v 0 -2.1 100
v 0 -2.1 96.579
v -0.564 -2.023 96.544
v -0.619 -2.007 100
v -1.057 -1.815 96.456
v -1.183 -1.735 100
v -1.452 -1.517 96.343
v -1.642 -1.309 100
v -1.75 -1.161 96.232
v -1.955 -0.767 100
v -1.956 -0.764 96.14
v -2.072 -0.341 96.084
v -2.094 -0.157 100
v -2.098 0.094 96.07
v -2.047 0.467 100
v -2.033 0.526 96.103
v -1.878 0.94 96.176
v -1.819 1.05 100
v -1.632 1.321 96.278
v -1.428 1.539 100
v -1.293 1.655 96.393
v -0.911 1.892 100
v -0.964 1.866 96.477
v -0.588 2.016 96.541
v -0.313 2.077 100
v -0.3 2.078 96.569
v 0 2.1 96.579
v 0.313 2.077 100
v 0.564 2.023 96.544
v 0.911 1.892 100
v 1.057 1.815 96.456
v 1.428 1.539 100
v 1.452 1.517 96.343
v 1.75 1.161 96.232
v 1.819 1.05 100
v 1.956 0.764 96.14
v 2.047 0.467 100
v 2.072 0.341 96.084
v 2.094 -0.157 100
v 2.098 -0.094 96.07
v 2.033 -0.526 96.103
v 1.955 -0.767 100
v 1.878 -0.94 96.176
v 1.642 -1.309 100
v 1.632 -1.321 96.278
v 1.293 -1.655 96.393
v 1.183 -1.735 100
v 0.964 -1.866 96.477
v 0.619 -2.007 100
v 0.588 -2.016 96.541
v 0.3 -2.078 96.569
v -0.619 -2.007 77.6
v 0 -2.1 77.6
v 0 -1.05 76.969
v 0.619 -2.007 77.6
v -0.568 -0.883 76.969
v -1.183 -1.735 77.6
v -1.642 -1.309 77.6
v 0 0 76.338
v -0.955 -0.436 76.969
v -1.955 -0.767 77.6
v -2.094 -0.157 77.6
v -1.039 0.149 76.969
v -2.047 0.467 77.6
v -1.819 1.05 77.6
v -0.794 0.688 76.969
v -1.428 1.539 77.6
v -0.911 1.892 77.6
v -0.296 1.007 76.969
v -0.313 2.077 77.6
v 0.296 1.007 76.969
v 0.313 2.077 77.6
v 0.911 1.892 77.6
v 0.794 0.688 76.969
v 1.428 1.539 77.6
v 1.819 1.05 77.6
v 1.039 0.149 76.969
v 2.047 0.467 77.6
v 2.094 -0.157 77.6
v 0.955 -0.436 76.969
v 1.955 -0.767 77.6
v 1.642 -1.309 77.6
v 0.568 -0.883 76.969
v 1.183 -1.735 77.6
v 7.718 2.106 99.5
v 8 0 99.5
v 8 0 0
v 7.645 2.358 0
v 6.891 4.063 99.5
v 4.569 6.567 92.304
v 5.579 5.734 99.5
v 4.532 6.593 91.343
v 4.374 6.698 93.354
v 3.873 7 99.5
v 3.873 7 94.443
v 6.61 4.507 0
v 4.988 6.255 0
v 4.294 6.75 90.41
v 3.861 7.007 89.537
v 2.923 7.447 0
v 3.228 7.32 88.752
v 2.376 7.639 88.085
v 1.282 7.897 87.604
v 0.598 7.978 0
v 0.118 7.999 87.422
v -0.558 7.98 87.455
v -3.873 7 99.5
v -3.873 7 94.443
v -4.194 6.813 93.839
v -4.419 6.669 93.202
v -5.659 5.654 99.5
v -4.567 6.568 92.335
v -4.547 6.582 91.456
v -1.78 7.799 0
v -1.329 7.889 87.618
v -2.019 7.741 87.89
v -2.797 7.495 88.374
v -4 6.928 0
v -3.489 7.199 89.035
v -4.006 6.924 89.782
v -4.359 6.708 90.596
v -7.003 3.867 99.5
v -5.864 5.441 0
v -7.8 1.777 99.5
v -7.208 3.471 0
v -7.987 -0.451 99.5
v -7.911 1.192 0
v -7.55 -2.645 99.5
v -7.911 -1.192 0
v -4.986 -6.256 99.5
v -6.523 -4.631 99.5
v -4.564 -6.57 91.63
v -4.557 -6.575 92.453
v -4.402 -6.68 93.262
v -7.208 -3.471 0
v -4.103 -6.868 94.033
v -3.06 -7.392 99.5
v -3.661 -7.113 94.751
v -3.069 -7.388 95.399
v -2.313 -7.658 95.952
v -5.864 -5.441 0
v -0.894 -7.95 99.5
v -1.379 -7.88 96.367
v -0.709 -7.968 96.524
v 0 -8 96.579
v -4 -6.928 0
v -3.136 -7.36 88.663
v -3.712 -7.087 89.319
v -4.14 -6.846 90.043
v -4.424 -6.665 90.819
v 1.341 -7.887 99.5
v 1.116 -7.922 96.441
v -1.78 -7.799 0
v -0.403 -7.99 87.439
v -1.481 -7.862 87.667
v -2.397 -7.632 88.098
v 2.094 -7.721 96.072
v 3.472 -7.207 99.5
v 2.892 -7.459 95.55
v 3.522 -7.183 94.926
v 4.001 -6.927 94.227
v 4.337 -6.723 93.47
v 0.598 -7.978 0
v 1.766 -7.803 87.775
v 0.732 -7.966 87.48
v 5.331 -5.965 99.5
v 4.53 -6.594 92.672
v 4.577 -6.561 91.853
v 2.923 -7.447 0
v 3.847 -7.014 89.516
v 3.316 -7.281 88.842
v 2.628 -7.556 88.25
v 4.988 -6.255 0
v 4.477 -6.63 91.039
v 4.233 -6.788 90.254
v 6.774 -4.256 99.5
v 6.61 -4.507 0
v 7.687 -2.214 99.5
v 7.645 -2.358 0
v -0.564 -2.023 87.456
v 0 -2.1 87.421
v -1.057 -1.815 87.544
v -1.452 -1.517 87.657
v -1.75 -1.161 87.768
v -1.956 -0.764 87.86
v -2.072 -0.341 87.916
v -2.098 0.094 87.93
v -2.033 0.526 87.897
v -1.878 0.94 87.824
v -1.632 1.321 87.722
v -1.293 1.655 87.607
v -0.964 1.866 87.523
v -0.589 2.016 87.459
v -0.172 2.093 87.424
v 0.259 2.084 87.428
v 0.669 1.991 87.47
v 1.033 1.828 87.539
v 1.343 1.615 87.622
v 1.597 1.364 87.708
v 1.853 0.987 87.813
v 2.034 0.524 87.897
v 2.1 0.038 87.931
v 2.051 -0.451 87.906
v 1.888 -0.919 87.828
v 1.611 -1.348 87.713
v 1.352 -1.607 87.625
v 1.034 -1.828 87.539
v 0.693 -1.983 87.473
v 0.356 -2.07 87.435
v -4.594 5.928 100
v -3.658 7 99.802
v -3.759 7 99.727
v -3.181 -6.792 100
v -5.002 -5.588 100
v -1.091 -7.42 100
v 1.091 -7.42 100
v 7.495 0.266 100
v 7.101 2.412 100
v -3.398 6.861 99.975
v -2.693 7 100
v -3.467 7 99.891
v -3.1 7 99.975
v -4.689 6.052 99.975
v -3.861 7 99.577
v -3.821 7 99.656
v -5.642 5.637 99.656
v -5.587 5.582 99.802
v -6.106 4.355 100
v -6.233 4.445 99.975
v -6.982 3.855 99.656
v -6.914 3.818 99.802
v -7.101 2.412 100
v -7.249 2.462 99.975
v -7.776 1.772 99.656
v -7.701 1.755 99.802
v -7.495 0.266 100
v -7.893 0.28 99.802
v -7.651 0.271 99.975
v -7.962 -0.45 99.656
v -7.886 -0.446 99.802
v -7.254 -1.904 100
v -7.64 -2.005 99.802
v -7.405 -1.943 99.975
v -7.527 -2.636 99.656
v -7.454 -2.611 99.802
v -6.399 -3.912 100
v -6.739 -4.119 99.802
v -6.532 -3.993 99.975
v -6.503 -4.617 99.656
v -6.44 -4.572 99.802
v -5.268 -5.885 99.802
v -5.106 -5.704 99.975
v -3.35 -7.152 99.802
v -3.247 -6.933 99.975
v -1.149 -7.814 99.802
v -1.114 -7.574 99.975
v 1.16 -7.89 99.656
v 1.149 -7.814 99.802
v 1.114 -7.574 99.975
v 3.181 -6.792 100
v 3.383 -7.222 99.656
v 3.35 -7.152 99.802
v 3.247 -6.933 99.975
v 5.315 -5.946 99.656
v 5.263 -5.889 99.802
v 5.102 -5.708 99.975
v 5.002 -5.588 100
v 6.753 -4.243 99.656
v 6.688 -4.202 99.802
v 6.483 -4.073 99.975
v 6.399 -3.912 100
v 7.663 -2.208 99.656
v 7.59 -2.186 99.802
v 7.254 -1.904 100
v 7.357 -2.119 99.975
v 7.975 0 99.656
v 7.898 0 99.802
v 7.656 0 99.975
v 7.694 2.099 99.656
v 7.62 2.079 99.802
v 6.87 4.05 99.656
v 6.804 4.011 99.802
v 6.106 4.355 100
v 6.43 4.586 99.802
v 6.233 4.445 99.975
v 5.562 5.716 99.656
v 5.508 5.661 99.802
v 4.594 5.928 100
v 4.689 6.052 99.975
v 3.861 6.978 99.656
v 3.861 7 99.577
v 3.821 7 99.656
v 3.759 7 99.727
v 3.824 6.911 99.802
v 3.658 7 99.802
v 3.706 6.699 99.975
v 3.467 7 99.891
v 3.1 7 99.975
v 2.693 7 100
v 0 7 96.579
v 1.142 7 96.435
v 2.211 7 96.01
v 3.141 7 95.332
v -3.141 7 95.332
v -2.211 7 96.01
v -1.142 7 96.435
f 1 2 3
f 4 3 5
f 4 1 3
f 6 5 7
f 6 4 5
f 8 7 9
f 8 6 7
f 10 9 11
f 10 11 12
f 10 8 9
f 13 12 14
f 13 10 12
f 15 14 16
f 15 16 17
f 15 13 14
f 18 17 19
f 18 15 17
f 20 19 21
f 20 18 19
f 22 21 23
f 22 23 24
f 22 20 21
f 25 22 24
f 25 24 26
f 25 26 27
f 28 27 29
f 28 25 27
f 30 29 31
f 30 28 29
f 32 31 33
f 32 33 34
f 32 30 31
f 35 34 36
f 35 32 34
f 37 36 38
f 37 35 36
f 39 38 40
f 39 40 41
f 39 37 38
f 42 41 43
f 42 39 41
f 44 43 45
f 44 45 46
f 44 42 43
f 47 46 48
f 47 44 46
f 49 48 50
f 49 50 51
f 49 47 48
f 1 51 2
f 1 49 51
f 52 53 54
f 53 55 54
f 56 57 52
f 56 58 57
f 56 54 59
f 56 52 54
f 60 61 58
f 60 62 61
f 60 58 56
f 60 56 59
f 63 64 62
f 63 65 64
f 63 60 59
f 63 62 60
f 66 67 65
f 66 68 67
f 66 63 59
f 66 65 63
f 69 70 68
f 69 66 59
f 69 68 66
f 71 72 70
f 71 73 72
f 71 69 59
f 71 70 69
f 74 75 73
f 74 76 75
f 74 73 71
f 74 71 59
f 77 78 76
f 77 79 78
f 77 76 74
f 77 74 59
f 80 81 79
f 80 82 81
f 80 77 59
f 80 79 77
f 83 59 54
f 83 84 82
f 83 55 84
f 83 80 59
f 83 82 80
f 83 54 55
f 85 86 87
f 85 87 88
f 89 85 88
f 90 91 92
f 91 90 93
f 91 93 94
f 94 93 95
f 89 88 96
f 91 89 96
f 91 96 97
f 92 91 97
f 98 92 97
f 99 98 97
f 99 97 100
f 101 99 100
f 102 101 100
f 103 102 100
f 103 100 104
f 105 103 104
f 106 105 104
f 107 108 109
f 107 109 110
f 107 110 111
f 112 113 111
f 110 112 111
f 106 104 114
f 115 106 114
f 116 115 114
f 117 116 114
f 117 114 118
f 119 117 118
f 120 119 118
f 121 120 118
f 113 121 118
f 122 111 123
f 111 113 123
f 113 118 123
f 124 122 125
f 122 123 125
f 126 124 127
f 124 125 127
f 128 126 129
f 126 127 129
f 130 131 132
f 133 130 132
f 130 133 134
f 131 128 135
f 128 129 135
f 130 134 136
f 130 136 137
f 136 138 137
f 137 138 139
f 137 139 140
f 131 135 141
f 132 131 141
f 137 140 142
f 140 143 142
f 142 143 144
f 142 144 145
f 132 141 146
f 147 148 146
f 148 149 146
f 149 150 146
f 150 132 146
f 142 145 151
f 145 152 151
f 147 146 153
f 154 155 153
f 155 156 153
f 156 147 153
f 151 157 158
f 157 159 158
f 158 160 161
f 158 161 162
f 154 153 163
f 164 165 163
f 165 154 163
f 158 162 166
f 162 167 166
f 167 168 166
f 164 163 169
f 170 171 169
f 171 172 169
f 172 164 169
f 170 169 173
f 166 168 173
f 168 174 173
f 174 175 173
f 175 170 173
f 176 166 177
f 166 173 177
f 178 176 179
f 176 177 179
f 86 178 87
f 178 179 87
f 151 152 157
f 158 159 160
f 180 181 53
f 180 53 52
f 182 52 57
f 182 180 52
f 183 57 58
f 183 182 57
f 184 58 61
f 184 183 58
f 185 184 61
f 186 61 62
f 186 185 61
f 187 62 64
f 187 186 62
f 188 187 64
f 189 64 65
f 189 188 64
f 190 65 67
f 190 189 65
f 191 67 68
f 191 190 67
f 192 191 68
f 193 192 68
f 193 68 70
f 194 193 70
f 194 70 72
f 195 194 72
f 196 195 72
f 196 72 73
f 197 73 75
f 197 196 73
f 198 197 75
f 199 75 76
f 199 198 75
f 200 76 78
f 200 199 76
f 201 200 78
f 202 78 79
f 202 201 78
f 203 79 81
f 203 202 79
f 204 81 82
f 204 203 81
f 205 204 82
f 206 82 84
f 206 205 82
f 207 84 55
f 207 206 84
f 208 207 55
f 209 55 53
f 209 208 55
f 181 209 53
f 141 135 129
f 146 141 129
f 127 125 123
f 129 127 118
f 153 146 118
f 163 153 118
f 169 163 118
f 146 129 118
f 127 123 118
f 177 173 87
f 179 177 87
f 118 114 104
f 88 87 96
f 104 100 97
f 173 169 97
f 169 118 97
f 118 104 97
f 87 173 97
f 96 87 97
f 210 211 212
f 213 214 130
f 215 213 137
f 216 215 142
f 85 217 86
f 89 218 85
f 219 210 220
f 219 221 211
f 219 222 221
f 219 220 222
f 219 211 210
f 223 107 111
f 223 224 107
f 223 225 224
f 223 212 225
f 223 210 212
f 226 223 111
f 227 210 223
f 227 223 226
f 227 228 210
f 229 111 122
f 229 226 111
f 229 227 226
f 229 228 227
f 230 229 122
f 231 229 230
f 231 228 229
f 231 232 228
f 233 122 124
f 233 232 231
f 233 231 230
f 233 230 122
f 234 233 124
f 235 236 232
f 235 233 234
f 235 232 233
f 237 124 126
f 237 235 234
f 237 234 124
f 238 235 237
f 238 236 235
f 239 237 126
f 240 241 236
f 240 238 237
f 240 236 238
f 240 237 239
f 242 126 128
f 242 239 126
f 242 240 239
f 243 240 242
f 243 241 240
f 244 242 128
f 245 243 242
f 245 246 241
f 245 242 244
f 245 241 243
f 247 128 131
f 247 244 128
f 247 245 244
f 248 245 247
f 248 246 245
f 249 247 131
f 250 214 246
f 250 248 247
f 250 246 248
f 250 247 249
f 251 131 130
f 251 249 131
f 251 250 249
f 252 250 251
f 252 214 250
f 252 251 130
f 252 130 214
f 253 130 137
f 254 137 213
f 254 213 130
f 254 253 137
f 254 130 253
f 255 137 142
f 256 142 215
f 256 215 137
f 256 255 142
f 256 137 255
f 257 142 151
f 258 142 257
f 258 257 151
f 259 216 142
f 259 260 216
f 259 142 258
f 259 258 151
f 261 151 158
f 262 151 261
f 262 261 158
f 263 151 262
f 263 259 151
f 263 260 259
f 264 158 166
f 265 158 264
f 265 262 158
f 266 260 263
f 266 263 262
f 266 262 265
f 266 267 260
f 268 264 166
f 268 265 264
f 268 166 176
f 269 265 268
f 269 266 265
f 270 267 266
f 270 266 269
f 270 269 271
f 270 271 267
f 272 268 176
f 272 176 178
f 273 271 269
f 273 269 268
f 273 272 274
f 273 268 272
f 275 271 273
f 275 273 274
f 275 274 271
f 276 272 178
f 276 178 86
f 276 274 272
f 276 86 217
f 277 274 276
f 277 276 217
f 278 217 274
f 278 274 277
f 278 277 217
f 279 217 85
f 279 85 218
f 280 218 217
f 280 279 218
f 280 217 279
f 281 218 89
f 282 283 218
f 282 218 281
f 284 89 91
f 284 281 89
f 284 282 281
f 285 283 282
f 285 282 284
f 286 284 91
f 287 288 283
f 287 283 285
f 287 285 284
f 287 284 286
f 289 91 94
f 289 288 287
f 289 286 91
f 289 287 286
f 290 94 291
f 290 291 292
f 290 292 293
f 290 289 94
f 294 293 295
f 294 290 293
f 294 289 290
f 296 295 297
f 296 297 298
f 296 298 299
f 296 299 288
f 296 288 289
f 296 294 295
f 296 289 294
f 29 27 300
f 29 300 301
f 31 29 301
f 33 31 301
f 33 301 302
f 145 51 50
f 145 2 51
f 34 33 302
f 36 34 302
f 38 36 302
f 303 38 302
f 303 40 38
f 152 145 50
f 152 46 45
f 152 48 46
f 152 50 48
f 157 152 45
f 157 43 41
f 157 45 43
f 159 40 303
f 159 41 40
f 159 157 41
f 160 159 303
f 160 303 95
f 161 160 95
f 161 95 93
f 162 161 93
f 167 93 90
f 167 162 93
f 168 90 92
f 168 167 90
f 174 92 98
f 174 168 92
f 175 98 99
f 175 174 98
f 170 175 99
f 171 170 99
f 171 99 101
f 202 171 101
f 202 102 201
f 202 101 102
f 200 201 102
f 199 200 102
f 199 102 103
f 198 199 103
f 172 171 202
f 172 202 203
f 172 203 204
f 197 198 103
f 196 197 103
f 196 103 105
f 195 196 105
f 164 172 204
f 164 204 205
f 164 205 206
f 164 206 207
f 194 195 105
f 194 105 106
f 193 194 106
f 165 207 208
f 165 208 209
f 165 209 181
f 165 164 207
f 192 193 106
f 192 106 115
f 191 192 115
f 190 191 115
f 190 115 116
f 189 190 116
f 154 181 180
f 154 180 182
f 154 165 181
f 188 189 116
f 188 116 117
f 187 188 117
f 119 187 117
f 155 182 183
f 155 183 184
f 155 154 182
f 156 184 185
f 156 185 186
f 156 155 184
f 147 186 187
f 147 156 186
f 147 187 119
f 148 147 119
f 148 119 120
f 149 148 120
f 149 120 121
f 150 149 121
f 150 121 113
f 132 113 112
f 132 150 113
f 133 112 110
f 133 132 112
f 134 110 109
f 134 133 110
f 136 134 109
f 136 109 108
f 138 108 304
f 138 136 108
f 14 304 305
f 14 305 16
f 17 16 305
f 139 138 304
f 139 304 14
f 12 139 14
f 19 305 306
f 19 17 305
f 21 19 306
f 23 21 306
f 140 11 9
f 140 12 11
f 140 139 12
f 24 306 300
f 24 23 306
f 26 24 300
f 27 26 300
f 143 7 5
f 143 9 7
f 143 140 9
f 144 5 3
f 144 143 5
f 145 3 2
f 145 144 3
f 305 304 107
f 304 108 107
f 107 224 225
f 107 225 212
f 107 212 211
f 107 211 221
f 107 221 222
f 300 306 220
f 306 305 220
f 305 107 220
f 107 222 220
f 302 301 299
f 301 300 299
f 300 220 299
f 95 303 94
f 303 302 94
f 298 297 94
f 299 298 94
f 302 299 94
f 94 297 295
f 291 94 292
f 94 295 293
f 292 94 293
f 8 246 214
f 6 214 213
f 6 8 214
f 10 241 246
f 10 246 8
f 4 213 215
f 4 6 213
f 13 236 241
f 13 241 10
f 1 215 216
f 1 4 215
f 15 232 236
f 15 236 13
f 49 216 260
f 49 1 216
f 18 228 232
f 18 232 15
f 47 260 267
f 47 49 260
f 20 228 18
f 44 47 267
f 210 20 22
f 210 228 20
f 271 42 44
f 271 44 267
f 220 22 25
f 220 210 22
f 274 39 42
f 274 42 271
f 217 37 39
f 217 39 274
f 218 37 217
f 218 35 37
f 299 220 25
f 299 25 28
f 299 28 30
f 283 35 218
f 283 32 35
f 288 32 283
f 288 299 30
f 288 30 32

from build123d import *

# Parameters (mm, degrees)
IZIM1_R                     = 8
Y_KSEKLIK_EKSTR_ZYON1_DEPTH = 100
RADYUS1_R                   = 0.5
IZIM4_W                     = 7.745966692
IZIM4_H                     = 1
KES_EKSTR_ZYON2_DEPTH       = 8
CORTAR_EXTRUIR1_DEPTH       = 101.637965119
CORTAR_EXTRUIR1_DEPTH_BACK  = 101.637965119
CROQUIS1_R                  = 4.579234369


with BuildPart() as part:
    # Çizim1 → Yükseklik-Ekstrüzyon1 (new body)
    with BuildSketch(Plane.XY):
        Circle(IZIM1_R)
    extrude(amount=Y_KSEKLIK_EKSTR_ZYON1_DEPTH)

    # Radyus1
    radyus1_edges = [part.edges().sort_by_distance(p)[0] for p in [
        (-8, 0, 100),
    ]]
    fillet(radyus1_edges, radius=RADYUS1_R)

    # Çizim3 → M5x0.8 Tapped Hole1 (revolve, cut)
    with BuildSketch(Plane(origin=(0, 0, 100), x_dir=(0, -1, 0), z_dir=(1, 0, 0))):
        Polygon((0, 0), (0, 23.6618073), (2.1, 22.4), (2.1, 0), align=None)
    revolve(axis=Axis((0, 0, 106.35), (0, 0, -1)), mode=Mode.SUBTRACT)

    # Çizim4 → Kes-Ekstrüzyon2 (cut)
    with BuildSketch(Plane.XY.offset(100)):
        with Locations((0, 7.5)):
            Rectangle(IZIM4_W, IZIM4_H)
    extrude(amount=-KES_EKSTR_ZYON2_DEPTH, mode=Mode.SUBTRACT)

    # Croquis1 → Cortar-Extruir1 (cut, two sides: drawn at the far end of the back side and taken through both)
    with BuildSketch(Plane(origin=(0, 0, 0), x_dir=(1, 0, 0), z_dir=(0, 1, 0)).offset(-CORTAR_EXTRUIR1_DEPTH_BACK)):
        with Locations(Location((0, -92, 0), (0, 0, 270))):
            Circle(CROQUIS1_R)
    extrude(amount=CORTAR_EXTRUIR1_DEPTH + CORTAR_EXTRUIR1_DEPTH_BACK, mode=Mode.SUBTRACT)


solid = part.part
